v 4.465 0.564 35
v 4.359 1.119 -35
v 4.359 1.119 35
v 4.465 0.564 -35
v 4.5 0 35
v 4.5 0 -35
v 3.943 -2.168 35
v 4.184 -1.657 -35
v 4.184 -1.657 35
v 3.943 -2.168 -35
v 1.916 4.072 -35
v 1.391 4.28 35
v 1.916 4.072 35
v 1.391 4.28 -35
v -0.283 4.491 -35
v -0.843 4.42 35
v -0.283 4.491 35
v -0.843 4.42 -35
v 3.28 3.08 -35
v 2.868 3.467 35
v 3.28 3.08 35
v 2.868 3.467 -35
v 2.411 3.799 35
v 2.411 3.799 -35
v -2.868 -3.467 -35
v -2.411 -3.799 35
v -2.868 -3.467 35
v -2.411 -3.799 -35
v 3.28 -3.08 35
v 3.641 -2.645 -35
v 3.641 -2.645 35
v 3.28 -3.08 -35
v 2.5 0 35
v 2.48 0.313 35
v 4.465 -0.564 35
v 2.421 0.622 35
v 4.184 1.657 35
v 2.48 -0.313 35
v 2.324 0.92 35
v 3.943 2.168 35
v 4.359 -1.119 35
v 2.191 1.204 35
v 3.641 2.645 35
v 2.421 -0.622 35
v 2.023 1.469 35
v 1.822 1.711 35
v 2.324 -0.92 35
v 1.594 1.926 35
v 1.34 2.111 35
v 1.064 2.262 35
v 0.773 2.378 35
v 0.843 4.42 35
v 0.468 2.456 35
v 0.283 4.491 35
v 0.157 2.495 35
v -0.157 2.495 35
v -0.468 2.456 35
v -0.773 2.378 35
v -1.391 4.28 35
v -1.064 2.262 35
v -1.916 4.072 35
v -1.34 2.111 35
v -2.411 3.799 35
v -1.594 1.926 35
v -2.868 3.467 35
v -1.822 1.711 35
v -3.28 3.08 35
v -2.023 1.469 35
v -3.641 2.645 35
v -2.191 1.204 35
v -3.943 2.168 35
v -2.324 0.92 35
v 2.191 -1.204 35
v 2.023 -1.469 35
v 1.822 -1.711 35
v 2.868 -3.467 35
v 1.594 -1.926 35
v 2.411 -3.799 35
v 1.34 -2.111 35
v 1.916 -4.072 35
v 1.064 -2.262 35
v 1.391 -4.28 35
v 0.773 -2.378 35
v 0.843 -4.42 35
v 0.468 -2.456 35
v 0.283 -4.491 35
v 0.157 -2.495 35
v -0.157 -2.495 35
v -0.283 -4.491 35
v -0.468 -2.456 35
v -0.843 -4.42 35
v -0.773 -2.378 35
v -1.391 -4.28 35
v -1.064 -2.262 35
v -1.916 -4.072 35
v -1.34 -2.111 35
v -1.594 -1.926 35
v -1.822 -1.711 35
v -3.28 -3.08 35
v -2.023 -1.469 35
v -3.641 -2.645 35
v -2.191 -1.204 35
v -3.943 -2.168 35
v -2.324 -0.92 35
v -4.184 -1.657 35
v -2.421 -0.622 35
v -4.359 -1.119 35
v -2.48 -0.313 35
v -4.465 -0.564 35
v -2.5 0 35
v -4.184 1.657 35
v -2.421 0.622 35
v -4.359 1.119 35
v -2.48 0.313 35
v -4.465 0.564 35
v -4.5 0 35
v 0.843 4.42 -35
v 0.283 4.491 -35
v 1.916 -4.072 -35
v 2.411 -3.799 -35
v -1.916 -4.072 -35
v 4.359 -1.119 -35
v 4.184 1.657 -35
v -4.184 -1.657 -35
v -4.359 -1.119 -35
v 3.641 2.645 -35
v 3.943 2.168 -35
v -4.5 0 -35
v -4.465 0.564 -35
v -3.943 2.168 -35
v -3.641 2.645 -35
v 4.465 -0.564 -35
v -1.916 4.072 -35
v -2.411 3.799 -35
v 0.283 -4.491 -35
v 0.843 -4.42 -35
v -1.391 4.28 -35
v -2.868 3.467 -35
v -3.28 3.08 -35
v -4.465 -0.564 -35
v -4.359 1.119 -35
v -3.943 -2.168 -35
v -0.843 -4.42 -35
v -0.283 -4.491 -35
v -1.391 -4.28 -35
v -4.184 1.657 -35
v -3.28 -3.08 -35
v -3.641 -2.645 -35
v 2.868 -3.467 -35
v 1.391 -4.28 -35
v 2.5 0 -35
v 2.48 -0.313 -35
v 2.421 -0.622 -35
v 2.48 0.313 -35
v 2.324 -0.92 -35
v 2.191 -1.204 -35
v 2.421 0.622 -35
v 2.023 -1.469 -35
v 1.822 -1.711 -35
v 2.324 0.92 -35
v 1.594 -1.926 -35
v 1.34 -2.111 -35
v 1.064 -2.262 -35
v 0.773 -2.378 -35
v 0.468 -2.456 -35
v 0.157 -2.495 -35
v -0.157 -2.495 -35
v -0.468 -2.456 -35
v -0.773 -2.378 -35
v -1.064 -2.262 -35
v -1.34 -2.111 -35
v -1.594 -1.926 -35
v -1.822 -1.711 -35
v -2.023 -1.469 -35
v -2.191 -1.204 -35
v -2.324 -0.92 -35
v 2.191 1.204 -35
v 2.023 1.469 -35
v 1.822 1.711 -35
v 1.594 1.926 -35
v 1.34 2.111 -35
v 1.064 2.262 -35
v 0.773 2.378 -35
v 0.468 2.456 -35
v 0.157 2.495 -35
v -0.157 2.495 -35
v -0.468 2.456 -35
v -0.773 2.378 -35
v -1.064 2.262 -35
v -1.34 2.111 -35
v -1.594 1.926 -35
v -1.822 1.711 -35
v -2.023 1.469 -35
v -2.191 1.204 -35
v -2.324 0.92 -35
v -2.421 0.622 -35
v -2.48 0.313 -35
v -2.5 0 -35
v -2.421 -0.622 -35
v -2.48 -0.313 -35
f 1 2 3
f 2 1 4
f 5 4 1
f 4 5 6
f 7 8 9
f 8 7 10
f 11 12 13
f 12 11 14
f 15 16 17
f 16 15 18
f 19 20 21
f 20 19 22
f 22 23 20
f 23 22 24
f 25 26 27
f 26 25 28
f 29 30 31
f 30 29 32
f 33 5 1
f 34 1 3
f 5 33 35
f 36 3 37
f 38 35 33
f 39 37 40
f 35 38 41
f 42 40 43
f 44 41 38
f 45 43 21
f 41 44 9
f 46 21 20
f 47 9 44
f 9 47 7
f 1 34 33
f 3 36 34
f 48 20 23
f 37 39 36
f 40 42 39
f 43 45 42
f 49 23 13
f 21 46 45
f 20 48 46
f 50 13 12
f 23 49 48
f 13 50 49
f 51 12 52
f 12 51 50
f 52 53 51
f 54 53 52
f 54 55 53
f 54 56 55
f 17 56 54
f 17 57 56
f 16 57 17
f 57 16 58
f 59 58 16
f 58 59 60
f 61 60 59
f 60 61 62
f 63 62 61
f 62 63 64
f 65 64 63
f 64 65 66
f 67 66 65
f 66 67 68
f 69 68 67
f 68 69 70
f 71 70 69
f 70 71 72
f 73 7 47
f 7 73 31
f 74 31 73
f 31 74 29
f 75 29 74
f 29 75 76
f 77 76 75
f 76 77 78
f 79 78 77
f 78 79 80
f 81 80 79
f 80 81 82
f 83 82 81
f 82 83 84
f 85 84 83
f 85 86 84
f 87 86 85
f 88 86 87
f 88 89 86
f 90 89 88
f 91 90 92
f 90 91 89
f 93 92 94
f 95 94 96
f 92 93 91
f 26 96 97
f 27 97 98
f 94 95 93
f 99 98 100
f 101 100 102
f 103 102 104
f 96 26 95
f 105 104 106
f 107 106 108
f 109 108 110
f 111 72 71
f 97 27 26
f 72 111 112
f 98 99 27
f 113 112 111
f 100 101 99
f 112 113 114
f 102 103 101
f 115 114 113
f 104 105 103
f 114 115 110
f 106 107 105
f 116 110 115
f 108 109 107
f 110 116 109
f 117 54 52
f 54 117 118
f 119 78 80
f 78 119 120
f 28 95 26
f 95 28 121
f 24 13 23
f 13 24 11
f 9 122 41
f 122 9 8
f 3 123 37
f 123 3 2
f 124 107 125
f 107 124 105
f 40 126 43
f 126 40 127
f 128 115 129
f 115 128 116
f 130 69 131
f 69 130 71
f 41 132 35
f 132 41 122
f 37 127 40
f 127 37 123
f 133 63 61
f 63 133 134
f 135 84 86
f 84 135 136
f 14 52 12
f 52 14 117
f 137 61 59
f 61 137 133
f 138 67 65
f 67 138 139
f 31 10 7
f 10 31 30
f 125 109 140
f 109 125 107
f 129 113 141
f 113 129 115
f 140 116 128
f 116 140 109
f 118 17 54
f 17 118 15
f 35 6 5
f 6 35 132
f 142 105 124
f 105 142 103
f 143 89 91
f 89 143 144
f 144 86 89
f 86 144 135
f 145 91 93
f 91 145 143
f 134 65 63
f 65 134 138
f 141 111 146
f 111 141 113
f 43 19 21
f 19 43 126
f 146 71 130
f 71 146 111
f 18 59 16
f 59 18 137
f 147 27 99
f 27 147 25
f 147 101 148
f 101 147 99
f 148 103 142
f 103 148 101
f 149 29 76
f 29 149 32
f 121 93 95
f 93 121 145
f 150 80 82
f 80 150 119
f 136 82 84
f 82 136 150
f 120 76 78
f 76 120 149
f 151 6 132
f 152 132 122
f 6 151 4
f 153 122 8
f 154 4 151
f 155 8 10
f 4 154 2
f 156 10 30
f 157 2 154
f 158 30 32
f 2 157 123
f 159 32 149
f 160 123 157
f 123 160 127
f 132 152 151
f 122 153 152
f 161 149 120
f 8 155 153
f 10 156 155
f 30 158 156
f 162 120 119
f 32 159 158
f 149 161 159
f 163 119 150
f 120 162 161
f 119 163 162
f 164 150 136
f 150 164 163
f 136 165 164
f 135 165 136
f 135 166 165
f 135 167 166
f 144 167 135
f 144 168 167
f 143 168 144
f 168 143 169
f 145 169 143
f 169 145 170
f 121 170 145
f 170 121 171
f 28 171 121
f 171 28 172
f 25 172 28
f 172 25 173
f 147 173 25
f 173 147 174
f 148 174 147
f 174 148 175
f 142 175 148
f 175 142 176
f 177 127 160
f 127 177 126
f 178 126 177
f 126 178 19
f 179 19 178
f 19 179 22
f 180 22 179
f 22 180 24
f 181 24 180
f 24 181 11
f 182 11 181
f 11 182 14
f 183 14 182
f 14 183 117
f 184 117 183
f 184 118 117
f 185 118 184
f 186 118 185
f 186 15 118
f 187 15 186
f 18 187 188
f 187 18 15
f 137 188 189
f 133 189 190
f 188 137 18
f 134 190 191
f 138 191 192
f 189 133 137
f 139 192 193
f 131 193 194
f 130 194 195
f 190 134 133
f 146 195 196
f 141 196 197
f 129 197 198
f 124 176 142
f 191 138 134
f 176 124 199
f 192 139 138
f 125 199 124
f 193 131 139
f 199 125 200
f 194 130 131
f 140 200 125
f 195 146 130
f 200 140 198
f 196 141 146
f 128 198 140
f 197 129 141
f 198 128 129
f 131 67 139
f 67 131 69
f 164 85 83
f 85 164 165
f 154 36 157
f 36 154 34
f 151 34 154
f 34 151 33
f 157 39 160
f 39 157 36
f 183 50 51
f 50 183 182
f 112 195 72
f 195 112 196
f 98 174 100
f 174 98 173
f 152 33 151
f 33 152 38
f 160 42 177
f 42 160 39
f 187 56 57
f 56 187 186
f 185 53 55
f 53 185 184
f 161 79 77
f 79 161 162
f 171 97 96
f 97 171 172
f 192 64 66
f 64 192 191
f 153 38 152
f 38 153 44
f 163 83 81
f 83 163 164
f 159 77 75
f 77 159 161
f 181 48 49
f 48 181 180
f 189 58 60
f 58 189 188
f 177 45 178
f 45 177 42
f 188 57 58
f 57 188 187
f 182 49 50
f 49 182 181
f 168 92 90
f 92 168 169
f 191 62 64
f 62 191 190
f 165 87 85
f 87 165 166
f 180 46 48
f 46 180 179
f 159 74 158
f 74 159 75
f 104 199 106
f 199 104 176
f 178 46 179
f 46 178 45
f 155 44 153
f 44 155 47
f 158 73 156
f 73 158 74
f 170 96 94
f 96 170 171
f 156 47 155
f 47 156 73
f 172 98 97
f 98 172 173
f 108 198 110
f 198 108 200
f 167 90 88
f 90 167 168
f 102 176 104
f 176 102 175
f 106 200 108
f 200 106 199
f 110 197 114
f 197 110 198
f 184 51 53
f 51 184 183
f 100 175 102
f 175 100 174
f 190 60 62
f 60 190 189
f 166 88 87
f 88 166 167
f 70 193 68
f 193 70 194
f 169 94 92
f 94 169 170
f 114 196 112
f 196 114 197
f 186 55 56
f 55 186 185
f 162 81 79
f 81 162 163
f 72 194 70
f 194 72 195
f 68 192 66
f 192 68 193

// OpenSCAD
$fn = 50;


difference() {
	union() {
		translate(v = [0, 0, -35.0000000000]) {
			cylinder(h = 70, r = 4.5000000000);
		}
	}
	union() {
		translate(v = [0, 0, -100.0000000000]) {
			cylinder(h = 200, r = 2.5000000000);
		}
	}
}
